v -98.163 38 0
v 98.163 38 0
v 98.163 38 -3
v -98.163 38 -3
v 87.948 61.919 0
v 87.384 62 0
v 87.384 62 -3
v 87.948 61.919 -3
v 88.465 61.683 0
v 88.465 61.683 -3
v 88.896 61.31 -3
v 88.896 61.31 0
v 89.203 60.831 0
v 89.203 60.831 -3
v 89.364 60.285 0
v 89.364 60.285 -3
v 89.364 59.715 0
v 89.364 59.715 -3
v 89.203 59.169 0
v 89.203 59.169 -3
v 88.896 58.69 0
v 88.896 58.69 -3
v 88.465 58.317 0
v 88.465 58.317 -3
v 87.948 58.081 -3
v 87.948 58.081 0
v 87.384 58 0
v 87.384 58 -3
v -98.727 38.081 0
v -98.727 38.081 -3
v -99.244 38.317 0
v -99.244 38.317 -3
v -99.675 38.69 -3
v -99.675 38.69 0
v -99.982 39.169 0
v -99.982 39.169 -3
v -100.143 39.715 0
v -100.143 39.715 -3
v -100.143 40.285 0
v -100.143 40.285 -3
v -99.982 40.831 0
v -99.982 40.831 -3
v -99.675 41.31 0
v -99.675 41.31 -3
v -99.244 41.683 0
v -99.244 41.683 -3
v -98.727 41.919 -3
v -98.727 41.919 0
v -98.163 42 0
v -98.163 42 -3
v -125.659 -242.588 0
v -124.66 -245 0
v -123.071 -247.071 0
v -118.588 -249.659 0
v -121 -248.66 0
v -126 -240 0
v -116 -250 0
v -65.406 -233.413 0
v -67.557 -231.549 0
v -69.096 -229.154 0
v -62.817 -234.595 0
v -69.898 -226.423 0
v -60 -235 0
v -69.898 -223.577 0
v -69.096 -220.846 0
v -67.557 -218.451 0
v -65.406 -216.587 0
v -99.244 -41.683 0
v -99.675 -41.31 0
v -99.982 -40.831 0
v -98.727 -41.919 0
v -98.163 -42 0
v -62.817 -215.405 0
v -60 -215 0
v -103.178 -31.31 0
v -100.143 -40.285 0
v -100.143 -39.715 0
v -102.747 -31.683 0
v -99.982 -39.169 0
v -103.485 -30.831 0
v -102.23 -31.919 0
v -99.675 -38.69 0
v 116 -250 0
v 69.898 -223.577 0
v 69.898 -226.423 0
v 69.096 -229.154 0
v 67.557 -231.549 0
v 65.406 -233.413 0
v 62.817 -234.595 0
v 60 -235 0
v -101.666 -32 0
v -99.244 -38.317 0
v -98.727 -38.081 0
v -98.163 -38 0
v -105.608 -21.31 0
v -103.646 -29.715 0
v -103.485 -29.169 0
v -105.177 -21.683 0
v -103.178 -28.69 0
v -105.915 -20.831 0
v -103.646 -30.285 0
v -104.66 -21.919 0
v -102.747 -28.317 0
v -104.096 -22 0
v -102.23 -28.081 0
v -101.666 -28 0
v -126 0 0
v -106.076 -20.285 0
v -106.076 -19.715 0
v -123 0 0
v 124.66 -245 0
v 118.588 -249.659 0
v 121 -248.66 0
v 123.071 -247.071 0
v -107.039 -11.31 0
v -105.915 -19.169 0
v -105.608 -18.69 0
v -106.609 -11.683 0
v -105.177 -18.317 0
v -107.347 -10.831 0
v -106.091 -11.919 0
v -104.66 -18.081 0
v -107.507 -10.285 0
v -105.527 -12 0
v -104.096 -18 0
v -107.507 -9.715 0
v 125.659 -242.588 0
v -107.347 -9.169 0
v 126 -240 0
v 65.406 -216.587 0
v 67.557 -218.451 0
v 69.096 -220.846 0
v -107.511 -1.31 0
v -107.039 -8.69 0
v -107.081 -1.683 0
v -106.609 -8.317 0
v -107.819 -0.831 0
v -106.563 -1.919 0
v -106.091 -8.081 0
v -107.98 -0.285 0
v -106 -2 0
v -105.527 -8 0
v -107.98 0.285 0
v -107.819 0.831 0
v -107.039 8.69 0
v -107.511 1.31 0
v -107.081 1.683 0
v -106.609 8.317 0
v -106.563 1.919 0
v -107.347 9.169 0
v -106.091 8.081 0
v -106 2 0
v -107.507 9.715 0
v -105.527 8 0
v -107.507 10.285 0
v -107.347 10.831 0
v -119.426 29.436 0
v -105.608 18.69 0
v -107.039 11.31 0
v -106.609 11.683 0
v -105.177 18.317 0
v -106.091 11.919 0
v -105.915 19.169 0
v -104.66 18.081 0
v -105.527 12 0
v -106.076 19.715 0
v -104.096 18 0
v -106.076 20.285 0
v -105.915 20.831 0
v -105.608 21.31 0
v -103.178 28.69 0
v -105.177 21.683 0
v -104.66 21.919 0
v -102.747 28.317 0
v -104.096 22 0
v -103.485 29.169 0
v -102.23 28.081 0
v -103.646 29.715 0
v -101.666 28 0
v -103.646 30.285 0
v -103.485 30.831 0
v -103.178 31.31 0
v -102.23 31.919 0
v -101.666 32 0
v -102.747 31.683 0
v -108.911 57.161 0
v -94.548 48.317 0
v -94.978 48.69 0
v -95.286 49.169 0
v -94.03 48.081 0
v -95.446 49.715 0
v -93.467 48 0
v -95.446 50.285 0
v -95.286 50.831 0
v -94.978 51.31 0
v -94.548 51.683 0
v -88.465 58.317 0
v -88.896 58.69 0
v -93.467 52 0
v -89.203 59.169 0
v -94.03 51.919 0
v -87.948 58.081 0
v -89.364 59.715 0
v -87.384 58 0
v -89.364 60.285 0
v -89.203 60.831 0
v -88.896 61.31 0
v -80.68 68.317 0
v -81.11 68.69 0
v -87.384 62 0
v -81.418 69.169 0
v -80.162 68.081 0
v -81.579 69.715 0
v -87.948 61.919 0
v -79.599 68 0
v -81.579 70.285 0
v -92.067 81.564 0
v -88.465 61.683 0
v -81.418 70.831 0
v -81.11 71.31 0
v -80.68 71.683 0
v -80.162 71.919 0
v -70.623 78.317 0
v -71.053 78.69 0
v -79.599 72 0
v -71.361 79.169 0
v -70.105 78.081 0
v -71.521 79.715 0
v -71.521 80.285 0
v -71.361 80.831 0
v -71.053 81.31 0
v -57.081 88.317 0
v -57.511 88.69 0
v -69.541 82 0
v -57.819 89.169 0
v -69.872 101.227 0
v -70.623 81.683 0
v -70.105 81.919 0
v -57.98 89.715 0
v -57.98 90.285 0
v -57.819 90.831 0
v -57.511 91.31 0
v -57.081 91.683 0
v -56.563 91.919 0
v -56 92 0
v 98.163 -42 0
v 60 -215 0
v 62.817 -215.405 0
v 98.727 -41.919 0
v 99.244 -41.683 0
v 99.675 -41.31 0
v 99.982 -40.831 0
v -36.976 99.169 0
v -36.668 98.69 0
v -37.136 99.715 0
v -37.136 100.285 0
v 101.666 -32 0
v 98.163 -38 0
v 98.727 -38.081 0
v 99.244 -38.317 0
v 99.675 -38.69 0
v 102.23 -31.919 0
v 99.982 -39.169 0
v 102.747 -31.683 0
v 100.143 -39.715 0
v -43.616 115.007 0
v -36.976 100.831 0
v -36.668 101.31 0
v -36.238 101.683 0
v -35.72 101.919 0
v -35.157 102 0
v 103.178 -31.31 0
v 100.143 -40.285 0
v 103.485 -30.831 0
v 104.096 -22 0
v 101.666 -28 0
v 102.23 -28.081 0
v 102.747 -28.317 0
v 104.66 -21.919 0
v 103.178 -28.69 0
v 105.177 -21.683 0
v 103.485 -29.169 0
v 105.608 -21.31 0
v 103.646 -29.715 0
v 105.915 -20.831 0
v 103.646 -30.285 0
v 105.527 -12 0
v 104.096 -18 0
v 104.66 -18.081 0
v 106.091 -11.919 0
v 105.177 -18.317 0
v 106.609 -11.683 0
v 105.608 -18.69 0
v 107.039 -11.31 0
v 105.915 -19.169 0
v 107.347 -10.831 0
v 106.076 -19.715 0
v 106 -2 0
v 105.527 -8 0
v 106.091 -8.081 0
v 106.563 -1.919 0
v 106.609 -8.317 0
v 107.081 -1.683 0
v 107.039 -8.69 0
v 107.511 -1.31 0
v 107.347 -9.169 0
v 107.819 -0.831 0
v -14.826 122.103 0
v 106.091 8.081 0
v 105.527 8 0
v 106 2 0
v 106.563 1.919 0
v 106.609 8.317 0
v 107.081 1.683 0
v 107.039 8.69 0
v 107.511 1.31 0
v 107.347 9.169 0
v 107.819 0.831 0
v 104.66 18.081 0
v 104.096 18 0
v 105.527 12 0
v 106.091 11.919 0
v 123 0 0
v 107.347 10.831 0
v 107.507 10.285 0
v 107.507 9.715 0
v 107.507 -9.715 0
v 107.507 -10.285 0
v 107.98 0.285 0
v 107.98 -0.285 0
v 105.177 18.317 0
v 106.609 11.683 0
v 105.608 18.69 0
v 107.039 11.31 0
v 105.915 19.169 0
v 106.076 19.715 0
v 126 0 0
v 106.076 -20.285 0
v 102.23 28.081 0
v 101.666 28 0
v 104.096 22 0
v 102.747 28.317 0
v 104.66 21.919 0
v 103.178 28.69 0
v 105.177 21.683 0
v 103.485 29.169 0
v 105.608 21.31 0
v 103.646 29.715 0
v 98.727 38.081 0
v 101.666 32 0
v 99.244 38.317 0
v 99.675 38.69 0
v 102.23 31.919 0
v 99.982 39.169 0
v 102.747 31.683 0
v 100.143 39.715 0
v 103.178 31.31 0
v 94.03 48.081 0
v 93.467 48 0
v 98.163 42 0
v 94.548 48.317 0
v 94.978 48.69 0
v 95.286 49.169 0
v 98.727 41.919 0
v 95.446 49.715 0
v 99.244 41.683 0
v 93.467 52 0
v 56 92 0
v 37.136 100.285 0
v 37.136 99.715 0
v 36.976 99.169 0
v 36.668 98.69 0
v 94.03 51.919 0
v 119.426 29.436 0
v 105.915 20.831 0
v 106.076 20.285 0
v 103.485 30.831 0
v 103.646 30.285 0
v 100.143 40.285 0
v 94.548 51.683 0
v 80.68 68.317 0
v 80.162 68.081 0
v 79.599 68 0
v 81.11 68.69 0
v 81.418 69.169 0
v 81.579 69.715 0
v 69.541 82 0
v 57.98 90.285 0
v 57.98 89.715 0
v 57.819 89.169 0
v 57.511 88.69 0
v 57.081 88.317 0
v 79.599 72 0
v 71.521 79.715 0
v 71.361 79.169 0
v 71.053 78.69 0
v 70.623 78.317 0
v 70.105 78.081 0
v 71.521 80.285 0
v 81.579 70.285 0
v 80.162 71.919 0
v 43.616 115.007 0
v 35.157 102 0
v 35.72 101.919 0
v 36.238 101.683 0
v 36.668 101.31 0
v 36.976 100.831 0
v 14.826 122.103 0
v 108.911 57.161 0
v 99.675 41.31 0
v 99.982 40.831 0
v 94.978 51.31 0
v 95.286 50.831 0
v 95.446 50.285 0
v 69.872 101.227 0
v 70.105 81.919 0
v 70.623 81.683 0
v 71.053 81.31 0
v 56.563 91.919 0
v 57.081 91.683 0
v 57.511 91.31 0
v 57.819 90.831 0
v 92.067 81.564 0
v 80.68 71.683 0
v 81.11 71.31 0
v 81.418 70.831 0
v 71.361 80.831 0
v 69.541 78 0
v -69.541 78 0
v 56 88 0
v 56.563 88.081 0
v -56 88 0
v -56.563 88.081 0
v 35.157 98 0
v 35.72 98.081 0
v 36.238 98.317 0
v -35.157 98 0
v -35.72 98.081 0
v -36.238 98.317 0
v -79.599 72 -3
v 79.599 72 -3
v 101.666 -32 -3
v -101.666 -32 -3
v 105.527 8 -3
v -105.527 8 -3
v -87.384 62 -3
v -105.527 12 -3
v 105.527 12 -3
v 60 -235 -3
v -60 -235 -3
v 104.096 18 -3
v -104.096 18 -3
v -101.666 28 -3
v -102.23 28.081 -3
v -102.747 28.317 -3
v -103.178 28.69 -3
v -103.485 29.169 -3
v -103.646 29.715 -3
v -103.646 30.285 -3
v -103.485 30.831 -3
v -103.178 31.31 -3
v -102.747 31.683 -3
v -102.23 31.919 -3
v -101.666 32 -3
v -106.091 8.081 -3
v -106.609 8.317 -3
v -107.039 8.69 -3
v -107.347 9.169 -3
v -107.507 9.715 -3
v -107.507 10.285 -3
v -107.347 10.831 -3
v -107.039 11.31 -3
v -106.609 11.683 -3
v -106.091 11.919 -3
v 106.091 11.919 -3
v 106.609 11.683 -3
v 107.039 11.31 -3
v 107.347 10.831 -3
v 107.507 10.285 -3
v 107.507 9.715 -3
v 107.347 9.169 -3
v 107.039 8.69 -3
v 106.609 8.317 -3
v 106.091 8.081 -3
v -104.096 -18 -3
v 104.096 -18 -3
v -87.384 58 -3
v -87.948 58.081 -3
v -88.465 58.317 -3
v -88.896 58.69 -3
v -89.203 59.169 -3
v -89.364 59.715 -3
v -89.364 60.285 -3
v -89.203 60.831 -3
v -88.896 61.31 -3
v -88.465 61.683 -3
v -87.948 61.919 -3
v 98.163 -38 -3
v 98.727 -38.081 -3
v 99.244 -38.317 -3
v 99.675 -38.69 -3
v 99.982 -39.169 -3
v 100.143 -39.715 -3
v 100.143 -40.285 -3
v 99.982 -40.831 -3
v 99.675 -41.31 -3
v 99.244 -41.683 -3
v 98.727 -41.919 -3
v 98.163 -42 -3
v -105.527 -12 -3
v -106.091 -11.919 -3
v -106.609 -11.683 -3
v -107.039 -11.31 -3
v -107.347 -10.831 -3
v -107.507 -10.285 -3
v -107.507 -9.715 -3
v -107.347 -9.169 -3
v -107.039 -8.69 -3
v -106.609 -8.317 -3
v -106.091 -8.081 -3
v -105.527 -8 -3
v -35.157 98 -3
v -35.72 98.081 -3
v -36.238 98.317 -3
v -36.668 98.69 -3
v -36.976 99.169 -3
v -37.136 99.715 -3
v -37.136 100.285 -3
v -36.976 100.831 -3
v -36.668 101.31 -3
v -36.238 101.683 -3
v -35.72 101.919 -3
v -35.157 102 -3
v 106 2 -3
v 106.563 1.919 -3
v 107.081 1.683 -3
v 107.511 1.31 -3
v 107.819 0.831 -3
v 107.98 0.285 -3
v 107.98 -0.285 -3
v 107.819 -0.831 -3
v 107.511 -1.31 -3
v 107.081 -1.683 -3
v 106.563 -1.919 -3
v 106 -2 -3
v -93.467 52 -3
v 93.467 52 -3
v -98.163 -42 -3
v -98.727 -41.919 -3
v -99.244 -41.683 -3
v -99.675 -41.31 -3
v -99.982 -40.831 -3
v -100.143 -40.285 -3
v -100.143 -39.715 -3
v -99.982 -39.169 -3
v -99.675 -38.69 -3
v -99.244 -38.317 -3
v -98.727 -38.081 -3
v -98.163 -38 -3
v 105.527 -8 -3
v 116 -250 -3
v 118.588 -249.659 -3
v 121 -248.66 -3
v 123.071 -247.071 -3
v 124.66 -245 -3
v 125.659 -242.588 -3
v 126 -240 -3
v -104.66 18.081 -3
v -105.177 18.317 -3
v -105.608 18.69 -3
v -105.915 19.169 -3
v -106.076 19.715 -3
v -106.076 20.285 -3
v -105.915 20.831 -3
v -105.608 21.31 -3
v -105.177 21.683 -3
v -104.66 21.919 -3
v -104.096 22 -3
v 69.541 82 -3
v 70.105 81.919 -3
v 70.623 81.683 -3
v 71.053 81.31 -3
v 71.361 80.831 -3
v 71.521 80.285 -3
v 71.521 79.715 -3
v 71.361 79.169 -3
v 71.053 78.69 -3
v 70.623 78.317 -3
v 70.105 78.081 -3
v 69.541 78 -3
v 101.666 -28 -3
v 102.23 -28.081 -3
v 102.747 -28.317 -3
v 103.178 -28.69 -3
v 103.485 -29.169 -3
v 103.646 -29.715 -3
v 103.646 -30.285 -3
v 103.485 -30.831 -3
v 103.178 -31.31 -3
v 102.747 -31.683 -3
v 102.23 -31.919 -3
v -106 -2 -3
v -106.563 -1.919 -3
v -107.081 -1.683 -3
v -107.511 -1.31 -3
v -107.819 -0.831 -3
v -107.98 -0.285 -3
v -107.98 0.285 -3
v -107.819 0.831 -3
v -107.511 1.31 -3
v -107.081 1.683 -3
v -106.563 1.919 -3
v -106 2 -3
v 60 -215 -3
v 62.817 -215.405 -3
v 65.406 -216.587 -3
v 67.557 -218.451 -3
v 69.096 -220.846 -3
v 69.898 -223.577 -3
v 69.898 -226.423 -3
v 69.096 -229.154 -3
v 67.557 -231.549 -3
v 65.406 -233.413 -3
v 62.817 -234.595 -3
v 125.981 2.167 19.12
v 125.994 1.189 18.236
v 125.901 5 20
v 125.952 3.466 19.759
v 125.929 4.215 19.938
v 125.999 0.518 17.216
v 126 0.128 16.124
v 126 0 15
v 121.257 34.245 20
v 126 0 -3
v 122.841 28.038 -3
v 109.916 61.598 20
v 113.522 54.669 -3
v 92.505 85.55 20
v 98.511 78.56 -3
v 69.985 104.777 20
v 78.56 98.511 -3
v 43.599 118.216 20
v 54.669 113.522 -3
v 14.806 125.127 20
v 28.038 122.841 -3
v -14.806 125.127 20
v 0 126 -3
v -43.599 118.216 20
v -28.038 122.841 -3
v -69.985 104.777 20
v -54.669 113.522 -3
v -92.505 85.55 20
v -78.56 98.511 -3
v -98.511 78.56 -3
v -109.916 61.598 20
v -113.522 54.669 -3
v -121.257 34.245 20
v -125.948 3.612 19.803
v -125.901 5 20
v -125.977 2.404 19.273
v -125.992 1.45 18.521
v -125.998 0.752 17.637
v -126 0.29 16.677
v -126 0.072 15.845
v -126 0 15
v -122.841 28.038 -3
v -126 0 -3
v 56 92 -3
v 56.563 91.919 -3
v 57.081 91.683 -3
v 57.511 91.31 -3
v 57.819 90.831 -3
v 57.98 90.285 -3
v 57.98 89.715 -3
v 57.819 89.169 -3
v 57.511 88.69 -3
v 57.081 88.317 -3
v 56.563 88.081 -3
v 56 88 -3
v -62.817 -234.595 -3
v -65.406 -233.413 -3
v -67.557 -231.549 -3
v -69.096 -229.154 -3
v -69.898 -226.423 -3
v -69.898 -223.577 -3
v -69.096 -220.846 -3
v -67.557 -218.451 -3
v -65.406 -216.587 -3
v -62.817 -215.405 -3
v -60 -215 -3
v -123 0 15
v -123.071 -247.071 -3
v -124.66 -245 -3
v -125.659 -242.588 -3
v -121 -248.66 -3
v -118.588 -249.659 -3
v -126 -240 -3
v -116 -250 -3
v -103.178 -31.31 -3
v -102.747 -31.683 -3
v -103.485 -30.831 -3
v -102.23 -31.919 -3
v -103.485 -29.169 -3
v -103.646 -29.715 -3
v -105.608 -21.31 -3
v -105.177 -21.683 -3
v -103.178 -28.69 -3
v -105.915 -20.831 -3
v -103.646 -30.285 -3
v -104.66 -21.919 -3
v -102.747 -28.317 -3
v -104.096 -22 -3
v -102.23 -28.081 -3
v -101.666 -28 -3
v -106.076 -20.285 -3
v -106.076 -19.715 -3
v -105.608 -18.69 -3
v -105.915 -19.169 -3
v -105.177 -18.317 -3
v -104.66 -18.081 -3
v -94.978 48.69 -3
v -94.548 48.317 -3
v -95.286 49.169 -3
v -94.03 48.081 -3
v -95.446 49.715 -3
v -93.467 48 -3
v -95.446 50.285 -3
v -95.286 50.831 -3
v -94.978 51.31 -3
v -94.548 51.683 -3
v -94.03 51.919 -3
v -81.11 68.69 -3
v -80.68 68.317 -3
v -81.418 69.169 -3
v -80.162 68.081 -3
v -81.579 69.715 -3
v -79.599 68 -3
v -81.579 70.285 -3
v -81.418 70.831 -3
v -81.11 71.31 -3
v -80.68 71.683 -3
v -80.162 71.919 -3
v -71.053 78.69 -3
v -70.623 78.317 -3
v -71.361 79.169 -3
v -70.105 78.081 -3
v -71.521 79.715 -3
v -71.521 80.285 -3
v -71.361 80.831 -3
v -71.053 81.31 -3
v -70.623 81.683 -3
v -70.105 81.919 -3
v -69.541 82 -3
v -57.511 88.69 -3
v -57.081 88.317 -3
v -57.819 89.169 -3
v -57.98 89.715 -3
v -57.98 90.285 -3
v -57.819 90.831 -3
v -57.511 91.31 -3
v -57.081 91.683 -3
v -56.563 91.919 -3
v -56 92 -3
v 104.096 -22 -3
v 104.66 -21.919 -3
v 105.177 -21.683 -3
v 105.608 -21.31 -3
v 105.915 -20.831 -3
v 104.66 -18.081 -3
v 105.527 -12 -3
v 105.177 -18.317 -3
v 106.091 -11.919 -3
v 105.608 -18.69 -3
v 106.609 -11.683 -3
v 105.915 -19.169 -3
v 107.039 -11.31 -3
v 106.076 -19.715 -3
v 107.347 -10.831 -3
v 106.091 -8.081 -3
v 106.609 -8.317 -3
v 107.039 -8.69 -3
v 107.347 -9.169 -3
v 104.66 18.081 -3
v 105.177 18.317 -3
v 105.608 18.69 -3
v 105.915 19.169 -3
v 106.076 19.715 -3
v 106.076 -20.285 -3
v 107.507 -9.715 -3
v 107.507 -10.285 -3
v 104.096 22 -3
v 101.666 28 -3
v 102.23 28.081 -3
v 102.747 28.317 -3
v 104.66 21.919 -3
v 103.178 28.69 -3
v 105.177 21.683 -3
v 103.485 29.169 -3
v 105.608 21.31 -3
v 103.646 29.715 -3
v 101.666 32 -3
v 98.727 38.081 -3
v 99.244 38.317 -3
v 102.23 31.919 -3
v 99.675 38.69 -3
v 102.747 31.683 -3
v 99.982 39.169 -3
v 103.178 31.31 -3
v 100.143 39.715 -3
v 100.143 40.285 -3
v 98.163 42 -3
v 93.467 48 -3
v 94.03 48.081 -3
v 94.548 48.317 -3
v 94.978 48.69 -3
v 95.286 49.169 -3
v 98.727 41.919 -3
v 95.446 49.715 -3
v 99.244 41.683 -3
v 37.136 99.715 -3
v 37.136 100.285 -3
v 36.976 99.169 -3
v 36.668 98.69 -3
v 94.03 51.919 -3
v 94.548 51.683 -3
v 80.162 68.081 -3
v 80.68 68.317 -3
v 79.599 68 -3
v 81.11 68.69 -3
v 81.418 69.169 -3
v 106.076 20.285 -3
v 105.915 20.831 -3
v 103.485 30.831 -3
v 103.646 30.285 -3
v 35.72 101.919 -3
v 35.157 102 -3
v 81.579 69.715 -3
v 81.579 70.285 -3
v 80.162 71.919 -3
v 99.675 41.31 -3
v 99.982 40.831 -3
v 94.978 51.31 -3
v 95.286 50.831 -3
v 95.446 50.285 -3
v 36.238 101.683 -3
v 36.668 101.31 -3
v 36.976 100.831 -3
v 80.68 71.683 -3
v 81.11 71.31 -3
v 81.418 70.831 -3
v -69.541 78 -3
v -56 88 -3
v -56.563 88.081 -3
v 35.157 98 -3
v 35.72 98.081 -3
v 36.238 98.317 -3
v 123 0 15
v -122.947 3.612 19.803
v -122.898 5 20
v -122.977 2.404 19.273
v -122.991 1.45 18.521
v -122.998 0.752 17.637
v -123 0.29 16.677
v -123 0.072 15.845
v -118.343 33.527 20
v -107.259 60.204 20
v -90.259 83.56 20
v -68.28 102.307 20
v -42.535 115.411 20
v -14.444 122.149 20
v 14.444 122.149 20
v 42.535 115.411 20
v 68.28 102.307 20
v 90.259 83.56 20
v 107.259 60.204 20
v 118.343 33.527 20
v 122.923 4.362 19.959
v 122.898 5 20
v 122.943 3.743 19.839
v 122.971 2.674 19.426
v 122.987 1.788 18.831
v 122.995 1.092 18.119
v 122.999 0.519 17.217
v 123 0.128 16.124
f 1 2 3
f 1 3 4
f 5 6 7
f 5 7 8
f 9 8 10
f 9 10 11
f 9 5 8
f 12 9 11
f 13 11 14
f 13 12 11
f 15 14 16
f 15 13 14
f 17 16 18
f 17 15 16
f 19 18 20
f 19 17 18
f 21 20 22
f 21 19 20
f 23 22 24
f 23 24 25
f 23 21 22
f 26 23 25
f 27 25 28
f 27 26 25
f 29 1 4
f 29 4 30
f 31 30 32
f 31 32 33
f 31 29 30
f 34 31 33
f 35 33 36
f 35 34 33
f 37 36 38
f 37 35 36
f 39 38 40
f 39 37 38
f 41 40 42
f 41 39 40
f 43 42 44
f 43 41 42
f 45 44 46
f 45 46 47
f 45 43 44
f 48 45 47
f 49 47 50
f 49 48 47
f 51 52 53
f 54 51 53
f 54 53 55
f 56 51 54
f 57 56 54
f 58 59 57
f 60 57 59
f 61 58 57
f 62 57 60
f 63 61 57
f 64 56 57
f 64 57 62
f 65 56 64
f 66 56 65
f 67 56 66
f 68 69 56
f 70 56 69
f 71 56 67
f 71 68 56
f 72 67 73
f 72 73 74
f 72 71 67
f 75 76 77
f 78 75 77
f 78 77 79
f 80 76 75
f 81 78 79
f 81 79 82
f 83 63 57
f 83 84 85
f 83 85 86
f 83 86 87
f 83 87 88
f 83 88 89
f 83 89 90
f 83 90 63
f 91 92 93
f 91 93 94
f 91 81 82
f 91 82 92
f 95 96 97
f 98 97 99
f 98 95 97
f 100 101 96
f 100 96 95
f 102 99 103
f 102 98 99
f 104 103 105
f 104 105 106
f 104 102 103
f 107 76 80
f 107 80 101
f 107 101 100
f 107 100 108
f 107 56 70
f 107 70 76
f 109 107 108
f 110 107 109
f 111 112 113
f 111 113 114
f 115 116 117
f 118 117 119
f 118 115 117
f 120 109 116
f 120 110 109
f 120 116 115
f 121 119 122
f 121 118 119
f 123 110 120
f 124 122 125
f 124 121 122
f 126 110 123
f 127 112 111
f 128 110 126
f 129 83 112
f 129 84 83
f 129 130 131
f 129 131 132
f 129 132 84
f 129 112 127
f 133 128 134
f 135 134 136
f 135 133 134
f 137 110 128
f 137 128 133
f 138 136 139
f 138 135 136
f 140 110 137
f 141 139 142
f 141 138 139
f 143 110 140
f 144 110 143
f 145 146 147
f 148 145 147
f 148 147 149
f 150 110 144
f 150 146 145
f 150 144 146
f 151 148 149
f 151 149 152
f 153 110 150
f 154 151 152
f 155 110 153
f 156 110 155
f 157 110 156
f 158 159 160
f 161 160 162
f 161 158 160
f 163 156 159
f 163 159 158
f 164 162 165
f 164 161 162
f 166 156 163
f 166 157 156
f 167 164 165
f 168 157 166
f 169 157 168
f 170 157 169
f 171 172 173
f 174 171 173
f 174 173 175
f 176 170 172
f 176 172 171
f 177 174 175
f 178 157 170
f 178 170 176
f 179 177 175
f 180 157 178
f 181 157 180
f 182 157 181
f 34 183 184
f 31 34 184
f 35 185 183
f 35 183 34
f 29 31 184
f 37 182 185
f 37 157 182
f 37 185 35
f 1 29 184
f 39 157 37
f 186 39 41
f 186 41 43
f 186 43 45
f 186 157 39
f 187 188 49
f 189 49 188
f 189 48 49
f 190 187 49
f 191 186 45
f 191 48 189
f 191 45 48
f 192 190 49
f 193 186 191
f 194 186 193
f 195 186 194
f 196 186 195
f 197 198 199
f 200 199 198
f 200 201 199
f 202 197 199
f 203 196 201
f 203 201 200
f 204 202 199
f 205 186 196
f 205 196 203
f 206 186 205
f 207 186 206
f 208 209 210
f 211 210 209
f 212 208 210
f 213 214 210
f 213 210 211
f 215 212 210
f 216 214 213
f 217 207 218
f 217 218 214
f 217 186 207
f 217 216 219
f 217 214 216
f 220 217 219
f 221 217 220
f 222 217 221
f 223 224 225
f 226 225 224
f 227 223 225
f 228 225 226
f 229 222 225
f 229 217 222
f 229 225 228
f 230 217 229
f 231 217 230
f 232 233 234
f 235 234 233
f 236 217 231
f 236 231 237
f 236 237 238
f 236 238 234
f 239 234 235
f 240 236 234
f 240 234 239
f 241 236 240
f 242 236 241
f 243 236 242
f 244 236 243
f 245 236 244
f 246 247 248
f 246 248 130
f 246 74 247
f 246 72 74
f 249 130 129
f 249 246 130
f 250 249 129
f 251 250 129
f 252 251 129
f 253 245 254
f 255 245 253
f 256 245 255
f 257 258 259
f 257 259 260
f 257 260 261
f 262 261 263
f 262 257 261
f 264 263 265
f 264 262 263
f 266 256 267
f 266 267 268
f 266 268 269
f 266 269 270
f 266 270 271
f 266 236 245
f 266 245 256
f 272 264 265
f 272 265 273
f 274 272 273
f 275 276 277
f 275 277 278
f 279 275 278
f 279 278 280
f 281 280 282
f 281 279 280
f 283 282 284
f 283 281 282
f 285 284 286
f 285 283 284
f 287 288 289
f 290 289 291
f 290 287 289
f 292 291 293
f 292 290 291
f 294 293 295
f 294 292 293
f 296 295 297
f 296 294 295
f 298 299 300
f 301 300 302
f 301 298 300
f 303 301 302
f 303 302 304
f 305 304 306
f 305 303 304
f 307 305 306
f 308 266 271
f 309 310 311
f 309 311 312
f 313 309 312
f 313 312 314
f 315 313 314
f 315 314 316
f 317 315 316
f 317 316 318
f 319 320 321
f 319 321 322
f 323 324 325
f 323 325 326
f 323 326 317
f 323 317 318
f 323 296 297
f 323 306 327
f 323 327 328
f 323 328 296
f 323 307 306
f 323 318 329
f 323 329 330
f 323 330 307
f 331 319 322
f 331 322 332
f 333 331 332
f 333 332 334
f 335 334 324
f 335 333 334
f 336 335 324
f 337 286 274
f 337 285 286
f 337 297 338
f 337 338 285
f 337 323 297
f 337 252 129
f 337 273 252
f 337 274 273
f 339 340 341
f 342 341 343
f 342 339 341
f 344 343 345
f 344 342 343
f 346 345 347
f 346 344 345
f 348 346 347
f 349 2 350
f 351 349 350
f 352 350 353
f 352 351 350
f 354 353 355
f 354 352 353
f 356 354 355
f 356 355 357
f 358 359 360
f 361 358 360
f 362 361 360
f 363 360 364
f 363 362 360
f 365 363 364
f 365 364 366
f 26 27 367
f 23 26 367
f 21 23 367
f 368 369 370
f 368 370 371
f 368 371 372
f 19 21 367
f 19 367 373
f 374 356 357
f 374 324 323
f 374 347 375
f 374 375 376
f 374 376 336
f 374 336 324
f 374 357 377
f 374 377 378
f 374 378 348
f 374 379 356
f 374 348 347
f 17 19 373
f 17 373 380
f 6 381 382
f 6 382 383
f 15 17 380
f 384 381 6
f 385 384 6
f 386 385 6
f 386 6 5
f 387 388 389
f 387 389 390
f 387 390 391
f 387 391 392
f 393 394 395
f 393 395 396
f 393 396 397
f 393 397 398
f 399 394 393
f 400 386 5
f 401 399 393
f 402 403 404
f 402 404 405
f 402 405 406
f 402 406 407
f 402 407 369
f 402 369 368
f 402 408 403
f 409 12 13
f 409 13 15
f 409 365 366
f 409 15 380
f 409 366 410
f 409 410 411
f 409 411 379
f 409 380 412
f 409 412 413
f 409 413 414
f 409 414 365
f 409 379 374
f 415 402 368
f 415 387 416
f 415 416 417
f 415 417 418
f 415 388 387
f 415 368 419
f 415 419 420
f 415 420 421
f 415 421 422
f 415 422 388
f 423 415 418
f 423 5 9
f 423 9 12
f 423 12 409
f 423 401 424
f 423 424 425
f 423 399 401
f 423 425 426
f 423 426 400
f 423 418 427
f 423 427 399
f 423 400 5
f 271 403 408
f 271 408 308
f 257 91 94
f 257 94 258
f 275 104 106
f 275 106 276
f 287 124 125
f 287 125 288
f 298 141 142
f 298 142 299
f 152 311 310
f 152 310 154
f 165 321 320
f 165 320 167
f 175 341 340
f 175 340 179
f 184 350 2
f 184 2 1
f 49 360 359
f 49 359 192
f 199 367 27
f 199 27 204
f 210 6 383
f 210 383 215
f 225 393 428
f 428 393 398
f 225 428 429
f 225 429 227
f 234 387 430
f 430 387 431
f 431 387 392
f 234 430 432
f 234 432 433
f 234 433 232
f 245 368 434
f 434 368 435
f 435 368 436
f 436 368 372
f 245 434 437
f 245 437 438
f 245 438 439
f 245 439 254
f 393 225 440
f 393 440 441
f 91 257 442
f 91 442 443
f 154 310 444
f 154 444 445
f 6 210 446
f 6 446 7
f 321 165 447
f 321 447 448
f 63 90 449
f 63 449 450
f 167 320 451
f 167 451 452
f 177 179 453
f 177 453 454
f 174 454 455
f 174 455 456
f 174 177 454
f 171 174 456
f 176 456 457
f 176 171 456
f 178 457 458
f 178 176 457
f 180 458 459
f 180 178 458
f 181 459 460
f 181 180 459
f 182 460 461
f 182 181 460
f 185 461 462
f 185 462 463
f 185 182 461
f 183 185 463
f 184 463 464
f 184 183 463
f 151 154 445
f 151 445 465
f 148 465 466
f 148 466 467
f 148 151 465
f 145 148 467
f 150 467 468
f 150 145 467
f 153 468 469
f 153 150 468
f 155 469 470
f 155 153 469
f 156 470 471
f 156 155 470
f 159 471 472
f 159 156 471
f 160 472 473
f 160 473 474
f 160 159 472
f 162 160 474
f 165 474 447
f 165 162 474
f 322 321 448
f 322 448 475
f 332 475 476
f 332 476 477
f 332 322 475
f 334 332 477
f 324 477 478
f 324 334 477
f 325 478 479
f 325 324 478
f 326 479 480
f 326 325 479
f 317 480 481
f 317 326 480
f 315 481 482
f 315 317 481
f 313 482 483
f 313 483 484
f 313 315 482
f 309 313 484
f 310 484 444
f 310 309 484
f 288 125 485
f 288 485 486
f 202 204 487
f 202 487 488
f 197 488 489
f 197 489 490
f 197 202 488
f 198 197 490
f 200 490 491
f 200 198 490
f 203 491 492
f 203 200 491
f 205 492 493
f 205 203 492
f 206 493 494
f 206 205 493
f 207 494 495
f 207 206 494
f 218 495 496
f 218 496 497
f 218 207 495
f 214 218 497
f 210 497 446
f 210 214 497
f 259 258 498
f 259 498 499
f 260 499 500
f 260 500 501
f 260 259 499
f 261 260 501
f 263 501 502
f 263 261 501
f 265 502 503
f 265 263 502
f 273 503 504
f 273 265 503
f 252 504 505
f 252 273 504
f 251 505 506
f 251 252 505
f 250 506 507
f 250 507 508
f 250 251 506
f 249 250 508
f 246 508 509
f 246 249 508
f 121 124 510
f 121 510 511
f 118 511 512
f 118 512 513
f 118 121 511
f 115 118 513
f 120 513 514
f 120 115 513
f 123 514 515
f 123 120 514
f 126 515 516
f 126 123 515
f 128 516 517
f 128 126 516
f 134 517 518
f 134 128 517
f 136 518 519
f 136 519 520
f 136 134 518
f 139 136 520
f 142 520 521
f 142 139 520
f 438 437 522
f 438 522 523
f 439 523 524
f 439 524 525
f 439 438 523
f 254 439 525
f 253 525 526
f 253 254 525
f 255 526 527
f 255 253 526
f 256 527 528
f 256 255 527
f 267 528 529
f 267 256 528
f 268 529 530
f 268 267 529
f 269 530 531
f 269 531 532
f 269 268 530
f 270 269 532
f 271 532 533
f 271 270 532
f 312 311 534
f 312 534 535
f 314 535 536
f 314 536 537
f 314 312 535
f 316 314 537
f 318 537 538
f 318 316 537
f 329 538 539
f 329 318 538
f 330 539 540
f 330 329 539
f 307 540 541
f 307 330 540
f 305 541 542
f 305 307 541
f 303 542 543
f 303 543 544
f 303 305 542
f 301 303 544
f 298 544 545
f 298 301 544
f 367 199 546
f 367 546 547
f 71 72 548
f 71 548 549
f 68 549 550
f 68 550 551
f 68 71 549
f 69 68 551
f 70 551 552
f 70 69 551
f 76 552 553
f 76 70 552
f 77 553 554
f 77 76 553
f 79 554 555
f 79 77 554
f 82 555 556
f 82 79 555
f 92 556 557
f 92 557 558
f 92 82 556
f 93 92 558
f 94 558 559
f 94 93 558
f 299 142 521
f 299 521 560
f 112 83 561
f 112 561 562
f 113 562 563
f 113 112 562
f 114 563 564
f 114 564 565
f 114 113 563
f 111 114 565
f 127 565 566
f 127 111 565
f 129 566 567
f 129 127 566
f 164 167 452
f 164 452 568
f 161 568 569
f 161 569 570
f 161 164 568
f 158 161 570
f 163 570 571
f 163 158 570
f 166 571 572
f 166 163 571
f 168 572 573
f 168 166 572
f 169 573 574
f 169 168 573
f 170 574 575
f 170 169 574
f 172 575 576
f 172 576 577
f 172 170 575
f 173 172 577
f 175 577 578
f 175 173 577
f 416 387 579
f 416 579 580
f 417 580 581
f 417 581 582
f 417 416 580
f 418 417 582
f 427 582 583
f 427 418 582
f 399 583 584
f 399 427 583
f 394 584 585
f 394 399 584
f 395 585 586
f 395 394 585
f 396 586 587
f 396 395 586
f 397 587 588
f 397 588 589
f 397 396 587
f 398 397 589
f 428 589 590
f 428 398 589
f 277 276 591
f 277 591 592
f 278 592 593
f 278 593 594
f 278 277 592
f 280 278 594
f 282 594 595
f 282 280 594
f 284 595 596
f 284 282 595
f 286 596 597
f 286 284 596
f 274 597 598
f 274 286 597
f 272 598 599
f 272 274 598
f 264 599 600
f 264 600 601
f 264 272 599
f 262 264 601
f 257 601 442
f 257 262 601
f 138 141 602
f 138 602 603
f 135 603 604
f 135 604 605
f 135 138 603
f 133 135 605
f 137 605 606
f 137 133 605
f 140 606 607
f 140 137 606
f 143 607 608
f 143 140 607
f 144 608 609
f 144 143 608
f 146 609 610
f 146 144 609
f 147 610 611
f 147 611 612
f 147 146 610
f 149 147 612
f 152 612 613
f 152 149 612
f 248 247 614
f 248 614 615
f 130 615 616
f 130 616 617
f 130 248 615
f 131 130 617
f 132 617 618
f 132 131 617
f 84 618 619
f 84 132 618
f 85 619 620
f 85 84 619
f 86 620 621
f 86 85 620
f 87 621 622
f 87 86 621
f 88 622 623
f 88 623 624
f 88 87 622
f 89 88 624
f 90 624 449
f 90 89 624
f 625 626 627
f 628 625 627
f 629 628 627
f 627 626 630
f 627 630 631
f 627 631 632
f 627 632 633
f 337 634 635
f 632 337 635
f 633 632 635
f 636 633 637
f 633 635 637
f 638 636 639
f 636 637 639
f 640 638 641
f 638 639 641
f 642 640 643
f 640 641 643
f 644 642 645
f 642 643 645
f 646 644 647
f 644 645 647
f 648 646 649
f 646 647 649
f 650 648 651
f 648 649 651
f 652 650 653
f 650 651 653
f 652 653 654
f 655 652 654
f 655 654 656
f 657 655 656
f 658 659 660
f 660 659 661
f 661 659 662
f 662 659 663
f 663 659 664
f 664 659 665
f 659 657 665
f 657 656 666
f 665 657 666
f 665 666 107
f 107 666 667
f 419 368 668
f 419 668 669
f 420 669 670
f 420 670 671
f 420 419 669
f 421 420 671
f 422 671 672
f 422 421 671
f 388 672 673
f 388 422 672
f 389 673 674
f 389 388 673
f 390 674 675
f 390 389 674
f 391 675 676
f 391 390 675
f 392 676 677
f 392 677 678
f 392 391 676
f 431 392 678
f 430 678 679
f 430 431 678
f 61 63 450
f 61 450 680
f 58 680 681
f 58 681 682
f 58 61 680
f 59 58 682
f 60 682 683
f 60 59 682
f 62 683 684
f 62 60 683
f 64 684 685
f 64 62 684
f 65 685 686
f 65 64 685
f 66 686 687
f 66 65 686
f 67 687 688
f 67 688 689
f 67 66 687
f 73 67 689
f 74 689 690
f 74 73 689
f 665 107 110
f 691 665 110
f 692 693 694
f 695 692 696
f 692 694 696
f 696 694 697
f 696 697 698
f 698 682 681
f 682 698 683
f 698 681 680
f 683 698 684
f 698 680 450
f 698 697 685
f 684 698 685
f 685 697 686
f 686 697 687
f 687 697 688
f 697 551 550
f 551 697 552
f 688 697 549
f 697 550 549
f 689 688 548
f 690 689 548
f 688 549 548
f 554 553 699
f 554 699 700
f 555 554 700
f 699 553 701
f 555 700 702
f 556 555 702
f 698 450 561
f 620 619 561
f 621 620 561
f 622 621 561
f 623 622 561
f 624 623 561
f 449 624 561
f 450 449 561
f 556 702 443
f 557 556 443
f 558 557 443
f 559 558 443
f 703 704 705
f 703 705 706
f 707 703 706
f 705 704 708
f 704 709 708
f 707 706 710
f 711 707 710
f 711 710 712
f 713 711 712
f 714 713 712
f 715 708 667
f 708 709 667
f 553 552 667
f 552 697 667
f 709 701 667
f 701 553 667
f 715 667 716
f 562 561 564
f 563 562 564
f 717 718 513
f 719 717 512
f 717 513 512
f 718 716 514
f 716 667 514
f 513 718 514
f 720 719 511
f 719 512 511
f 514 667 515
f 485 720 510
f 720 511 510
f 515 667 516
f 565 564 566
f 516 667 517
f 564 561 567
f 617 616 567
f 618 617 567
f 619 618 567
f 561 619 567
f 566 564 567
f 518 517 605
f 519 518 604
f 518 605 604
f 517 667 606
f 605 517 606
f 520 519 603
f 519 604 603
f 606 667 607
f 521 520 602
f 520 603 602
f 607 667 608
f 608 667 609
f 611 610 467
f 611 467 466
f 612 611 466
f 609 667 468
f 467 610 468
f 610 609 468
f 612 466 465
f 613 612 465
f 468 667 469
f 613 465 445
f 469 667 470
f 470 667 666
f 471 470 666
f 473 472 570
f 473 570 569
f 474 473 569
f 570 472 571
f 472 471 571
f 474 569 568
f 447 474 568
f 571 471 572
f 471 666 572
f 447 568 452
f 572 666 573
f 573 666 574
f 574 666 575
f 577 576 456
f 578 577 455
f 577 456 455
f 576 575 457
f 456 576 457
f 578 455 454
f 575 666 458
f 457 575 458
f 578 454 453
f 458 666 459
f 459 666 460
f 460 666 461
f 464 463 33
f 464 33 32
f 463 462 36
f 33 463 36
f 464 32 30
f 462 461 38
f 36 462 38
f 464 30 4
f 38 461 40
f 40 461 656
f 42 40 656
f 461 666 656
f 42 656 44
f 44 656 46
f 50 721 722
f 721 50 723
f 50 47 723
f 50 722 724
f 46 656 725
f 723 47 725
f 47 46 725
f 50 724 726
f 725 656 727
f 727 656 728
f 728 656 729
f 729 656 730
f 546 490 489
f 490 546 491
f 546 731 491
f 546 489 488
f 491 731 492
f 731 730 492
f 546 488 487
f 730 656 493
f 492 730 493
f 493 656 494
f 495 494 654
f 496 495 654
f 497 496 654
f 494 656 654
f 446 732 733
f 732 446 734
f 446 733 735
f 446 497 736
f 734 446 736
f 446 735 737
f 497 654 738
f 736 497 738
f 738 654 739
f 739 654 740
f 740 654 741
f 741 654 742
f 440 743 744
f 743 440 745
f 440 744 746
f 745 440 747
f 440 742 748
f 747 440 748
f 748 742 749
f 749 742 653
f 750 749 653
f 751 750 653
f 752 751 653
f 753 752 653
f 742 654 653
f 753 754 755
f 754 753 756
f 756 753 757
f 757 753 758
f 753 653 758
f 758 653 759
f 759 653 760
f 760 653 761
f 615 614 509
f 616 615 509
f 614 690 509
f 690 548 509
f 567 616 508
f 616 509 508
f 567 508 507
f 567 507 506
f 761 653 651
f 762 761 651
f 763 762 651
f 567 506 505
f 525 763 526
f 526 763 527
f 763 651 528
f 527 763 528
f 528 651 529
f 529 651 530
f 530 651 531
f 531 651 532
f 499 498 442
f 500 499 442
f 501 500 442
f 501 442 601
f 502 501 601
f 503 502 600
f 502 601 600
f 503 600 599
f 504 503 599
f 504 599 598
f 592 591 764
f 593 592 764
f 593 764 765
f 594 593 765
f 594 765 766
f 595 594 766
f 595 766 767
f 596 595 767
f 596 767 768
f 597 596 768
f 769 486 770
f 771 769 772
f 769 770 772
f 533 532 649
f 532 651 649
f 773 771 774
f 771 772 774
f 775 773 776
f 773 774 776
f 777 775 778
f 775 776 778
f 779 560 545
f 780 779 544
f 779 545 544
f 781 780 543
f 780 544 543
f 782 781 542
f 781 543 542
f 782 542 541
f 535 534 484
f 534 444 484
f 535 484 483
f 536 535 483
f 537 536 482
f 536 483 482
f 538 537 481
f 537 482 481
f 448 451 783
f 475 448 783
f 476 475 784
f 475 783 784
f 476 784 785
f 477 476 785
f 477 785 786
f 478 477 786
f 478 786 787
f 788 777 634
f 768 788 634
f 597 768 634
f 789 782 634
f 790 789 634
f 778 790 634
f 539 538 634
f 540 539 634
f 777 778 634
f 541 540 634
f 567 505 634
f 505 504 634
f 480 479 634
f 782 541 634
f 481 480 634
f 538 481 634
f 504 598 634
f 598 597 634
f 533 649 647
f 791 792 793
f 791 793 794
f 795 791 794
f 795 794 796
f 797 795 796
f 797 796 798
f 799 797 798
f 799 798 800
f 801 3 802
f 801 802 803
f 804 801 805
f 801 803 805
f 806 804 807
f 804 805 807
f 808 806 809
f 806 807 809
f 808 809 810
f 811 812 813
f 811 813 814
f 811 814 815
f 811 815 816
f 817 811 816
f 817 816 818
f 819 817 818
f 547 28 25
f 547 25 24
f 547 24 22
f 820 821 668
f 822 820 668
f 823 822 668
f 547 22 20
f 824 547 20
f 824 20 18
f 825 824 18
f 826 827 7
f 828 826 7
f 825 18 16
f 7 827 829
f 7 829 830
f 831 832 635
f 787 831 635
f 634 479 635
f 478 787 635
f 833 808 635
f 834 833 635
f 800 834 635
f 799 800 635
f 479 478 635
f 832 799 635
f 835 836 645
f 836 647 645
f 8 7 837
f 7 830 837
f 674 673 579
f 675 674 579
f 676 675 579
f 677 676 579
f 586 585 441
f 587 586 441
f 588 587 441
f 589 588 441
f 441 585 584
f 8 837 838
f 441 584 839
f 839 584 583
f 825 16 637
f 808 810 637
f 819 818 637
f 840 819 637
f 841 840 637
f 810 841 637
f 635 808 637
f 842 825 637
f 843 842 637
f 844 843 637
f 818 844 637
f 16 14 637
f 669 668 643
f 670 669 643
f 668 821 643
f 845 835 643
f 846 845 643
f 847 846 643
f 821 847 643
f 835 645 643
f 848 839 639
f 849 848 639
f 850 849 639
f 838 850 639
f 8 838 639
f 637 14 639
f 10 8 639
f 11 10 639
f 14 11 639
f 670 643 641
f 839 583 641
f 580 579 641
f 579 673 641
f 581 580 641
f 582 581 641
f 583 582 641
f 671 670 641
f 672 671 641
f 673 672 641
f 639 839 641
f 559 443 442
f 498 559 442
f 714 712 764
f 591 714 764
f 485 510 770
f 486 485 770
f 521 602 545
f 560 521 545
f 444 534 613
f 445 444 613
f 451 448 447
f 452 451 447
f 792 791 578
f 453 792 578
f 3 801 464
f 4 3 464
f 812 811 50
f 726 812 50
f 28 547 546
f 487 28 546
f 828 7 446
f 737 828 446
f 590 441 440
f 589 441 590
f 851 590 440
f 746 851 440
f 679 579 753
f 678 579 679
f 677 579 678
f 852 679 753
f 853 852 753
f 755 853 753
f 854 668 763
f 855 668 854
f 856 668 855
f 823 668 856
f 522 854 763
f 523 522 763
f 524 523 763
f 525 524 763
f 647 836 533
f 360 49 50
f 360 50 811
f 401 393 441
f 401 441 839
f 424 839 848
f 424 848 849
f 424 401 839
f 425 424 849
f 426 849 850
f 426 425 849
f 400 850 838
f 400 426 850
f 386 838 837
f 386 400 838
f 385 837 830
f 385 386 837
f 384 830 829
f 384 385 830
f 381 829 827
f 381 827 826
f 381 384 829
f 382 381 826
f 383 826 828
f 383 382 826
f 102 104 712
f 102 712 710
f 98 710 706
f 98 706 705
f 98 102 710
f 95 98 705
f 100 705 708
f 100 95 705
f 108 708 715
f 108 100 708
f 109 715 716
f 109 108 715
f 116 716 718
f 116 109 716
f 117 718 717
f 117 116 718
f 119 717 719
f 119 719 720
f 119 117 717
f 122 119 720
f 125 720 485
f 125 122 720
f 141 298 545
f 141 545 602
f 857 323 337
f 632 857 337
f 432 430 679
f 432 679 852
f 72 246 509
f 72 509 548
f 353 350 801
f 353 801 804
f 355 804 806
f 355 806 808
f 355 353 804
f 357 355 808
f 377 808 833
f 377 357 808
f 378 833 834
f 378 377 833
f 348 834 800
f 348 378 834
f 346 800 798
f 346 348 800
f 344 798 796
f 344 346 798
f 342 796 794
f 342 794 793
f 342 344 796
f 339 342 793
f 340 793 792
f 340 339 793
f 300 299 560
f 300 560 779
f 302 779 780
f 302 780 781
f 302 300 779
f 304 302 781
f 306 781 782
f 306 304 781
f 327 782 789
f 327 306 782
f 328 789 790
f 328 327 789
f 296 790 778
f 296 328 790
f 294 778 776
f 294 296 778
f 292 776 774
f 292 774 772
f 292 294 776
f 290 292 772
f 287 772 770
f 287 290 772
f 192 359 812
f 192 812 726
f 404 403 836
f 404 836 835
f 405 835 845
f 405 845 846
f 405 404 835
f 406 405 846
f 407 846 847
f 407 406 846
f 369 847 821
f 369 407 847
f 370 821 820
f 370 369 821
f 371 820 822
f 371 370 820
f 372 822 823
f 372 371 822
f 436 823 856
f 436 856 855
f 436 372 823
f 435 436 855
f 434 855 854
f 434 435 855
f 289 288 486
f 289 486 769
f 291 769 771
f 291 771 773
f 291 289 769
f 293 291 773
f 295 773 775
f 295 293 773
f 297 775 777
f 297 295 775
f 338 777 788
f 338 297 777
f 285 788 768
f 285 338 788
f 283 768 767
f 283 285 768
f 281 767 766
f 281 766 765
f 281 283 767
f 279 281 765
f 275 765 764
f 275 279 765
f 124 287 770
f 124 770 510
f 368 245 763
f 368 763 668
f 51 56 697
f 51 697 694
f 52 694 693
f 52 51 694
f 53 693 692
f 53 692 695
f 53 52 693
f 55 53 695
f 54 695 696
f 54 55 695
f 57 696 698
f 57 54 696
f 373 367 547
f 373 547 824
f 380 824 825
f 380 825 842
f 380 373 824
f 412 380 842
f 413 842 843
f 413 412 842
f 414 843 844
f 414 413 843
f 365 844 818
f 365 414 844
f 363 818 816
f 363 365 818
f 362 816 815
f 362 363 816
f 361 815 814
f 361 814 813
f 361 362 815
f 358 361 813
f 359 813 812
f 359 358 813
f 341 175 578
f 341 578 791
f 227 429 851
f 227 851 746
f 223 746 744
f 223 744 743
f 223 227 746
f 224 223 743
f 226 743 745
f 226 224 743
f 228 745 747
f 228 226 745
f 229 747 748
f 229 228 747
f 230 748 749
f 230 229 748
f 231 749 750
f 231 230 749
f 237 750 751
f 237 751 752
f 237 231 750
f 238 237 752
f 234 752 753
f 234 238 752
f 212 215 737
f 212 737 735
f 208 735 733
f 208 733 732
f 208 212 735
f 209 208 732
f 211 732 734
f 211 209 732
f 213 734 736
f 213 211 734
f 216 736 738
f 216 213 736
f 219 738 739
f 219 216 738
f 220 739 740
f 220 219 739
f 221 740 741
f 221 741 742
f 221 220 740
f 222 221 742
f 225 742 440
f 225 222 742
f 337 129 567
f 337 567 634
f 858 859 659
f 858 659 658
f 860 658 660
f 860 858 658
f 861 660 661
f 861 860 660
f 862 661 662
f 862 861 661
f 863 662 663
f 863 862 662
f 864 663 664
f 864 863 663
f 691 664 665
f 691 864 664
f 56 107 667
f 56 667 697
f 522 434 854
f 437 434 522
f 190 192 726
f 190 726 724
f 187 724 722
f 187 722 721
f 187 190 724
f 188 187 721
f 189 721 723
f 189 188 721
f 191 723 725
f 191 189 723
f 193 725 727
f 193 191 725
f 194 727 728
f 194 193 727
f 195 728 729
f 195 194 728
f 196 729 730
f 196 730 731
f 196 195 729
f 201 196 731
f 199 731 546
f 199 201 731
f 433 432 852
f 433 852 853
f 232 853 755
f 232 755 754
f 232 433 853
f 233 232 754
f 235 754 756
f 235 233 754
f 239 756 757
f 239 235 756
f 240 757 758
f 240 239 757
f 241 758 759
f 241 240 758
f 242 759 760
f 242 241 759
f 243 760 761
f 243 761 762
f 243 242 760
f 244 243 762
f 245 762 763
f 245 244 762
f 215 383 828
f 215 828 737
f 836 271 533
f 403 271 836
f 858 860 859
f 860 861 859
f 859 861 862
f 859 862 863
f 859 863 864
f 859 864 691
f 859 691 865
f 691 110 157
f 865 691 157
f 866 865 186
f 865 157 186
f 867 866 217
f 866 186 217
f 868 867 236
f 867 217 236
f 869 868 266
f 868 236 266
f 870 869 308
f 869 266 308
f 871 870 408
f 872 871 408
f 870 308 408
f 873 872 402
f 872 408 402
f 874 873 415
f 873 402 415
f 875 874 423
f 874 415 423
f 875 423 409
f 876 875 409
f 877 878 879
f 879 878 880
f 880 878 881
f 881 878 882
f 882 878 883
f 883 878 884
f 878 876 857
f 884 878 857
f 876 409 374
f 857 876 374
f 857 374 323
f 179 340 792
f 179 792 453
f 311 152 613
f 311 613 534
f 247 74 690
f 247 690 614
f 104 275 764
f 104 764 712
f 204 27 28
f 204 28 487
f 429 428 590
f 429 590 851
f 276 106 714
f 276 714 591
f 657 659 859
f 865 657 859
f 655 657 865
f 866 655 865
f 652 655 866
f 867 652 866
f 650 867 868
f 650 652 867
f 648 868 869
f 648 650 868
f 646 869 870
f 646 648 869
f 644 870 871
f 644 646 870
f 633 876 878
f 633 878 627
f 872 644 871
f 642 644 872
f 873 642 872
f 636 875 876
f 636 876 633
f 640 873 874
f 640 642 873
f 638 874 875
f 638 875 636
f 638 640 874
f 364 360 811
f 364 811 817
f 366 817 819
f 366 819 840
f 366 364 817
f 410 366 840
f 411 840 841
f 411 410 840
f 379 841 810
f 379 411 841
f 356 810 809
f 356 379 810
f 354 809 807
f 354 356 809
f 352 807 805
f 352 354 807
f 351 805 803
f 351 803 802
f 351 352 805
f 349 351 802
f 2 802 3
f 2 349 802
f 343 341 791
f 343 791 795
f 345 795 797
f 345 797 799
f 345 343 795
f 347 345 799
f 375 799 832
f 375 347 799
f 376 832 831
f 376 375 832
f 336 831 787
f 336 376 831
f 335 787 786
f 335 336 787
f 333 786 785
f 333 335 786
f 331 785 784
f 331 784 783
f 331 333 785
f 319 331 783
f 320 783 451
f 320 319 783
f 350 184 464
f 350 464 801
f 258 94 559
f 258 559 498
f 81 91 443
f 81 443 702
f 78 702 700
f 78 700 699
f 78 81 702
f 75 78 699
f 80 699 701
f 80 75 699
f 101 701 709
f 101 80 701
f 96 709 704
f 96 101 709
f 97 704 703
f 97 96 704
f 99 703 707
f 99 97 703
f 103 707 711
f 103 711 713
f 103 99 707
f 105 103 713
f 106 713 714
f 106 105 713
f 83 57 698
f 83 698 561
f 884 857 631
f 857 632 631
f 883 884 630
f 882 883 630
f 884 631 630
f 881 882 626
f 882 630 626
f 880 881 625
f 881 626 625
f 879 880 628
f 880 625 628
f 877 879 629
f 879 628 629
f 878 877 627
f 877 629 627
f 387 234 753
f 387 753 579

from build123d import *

# Parameters (mm, degrees)
F1_DEPTH = 3
F2_DEPTH = 20
F3_R     = 5


with BuildPart() as f1:
    # F0 (on Top) → F1 (new body)
    with BuildSketch(Plane.XY):
        with BuildLine():
            Line((126, -240), (126, 0))
            Line((126, 0), (123, 0))
            ThreePointArc((123, 0), (0, 123), (-123, 0))
            Line((-123, 0), (-126, 0))
            Line((-126, 0), (-126, -240))
            ThreePointArc((-126, -240), (-123.071068, -247.071068), (-116, -250))
            Line((-116, -250), (116, -250))
            ThreePointArc((116, -250), (123.071068, -247.071068), (126, -240))
        make_face()
        with BuildLine():
            Line((60, -235), (-60, -235))
            ThreePointArc((-60, -235), (-70, -225), (-60, -215))
            Line((-60, -215), (60, -215))
            ThreePointArc((60, -215), (70, -225), (60, -235))
        make_face(mode=Mode.SUBTRACT)
        with BuildLine():
            ThreePointArc((98.16313, -38), (100.16313, -40), (98.16313, -42))
            Line((98.16313, -42), (-98.16313, -42))
            ThreePointArc((-98.16313, -42), (-100.16313, -40), (-98.16313, -38))
            Line((-98.16313, -38), (98.16313, -38))
        make_face(mode=Mode.SUBTRACT)
        with BuildLine():
            ThreePointArc((-101.66612, -32), (-103.66612, -30), (-101.66612, -28))
            Line((-101.66612, -28), (101.66612, -28))
            ThreePointArc((101.66612, -28), (103.66612, -30), (101.66612, -32))
            Line((101.66612, -32), (-101.66612, -32))
        make_face(mode=Mode.SUBTRACT)
        with BuildLine():
            ThreePointArc((104.096109, -18), (106.096109, -20), (104.096109, -22))
            Line((104.096109, -22), (-104.096109, -22))
            ThreePointArc((-104.096109, -22), (-106.096109, -20), (-104.096109, -18))
            Line((-104.096109, -18), (104.096109, -18))
        make_face(mode=Mode.SUBTRACT)
        with BuildLine():
            ThreePointArc((-105.527248, -12), (-107.527248, -10), (-105.527248, -8))
            Line((-105.527248, -8), (105.527248, -8))
            ThreePointArc((105.527248, -8), (107.527248, -10), (105.527248, -12))
            Line((105.527248, -12), (-105.527248, -12))
        make_face(mode=Mode.SUBTRACT)
        with BuildLine():
            Line((106, -2), (-106, -2))
            ThreePointArc((-106, -2), (-108, 0), (-106, 2))
            Line((-106, 2), (106, 2))
            ThreePointArc((106, 2), (108, 0), (106, -2))
        make_face(mode=Mode.SUBTRACT)
        with BuildLine():
            Line((105.527248, 8), (-105.527248, 8))
            ThreePointArc((-105.527248, 8), (-107.527248, 10), (-105.527248, 12))
            Line((-105.527248, 12), (105.527248, 12))
            ThreePointArc((105.527248, 12), (107.527248, 10), (105.527248, 8))
        make_face(mode=Mode.SUBTRACT)
        with BuildLine():
            Line((104.096109, 18), (-104.096109, 18))
            ThreePointArc((-104.096109, 18), (-106.096109, 20), (-104.096109, 22))
            Line((-104.096109, 22), (104.096109, 22))
            ThreePointArc((104.096109, 22), (106.096109, 20), (104.096109, 18))
        make_face(mode=Mode.SUBTRACT)
        with BuildLine():
            Line((101.66612, 28), (-101.66612, 28))
            ThreePointArc((-101.66612, 28), (-103.66612, 30), (-101.66612, 32))
            Line((-101.66612, 32), (101.66612, 32))
            ThreePointArc((101.66612, 32), (103.66612, 30), (101.66612, 28))
        make_face(mode=Mode.SUBTRACT)
        with BuildLine():
            Line((98.16313, 38), (-98.16313, 38))
            ThreePointArc((-98.16313, 38), (-100.16313, 40), (-98.16313, 42))
            Line((-98.16313, 42), (98.16313, 42))
            ThreePointArc((98.16313, 42), (100.16313, 40), (98.16313, 38))
        make_face(mode=Mode.SUBTRACT)
        with BuildLine():
            Line((93.466572, 48), (-93.466572, 48))
            ThreePointArc((-93.466572, 48), (-95.466572, 50), (-93.466572, 52))
            Line((-93.466572, 52), (93.466572, 52))
            ThreePointArc((93.466572, 52), (95.466572, 50), (93.466572, 48))
        make_face(mode=Mode.SUBTRACT)
        with BuildLine():
            Line((87.384209, 58), (-87.384209, 58))
            ThreePointArc((-87.384209, 58), (-89.384209, 60), (-87.384209, 62))
            Line((-87.384209, 62), (87.384209, 62))
            ThreePointArc((87.384209, 62), (89.384209, 60), (87.384209, 58))
        make_face(mode=Mode.SUBTRACT)
        with BuildLine():
            Line((79.598995, 68), (-79.598995, 68))
            ThreePointArc((-79.598995, 68), (-81.598995, 70), (-79.598995, 72))
            Line((-79.598995, 72), (79.598995, 72))
            ThreePointArc((79.598995, 72), (81.598995, 70), (79.598995, 68))
        make_face(mode=Mode.SUBTRACT)
        with BuildLine():
            Line((69.541355, 78), (-69.541355, 78))
            ThreePointArc((-69.541355, 78), (-71.541355, 80), (-69.541355, 82))
            Line((-69.541355, 82), (69.541355, 82))
            ThreePointArc((69.541355, 82), (71.541355, 80), (69.541355, 78))
        make_face(mode=Mode.SUBTRACT)
        with BuildLine():
            Line((56, 88), (-56, 88))
            ThreePointArc((-56, 88), (-58, 90), (-56, 92))
            Line((-56, 92), (56, 92))
            ThreePointArc((56, 92), (58, 90), (56, 88))
        make_face(mode=Mode.SUBTRACT)
        with BuildLine():
            Line((35.156792, 98), (-35.156792, 98))
            ThreePointArc((-35.156792, 98), (-37.156792, 100), (-35.156792, 102))
            Line((-35.156792, 102), (35.156792, 102))
            ThreePointArc((35.156792, 102), (37.156792, 100), (35.156792, 98))
        make_face(mode=Mode.SUBTRACT)
        with BuildLine():
            Line((123, 0), (126, 0))
            ThreePointArc((126, 0), (0, 126), (-126, 0))
            Line((-126, 0), (-123, 0))
            ThreePointArc((-123, 0), (0, 123), (123, 0))
        make_face()
    extrude(amount=-F1_DEPTH)

    # F0 (on Top) → F2 (join)
    with BuildSketch(Plane.XY):
        with BuildLine():
            Line((123, 0), (126, 0))
            ThreePointArc((126, 0), (0, 126), (-126, 0))
            Line((-126, 0), (-123, 0))
            ThreePointArc((-123, 0), (0, 123), (123, 0))
        make_face()
    extrude(amount=F2_DEPTH)

    # F3
    f3_edges = [f1.edges().sort_by_distance(p)[0] for p in [
        (-124.5, 0, 20),
        (124.5, 0, 20),
    ]]
    fillet(f3_edges, radius=F3_R)


solid = f1.part
